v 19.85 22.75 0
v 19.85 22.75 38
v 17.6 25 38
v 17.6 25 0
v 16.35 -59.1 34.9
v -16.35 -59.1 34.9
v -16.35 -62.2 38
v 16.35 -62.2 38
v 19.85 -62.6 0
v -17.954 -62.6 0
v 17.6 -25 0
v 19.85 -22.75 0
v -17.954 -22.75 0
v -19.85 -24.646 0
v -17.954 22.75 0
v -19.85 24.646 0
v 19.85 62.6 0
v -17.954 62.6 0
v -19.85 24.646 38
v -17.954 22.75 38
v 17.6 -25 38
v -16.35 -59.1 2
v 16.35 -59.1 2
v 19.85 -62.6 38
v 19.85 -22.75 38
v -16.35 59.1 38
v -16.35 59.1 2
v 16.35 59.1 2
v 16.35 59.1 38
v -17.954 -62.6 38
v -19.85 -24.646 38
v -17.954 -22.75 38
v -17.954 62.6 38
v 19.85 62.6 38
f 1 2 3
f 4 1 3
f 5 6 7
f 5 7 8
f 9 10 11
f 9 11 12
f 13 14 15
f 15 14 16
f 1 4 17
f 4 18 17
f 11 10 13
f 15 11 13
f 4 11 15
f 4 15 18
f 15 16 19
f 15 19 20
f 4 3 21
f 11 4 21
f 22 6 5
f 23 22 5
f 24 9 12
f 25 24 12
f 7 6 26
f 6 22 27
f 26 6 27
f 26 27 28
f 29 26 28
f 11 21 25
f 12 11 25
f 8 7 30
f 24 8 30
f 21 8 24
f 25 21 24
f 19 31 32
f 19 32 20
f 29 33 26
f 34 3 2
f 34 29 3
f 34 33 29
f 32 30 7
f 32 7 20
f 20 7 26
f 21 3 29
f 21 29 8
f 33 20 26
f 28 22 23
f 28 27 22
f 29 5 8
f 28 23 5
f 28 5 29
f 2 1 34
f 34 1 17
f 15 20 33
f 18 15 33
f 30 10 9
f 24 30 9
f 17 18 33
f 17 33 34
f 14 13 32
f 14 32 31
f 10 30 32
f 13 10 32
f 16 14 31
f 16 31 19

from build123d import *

# Parameters (mm, degrees)
F0_W     = 39.7
F0_H     = 125.2
F0_W_2   = 32.7
F0_H_2   = 118.2
F1_DEPTH = 2
F2_DEPTH = 38
F4_DEPTH = 38.001
F5_SIZE  = 3.1


with BuildPart() as f1:
    # F0 (on Top) → F1 (new body)
    with BuildSketch(Plane.XY):
        Rectangle(F0_W, F0_H)
        Rectangle(F0_W_2, F0_H_2, mode=Mode.SUBTRACT)
        Rectangle(F0_W_2, F0_H_2)
    extrude(amount=F1_DEPTH)

    # F0 (on Top) → F2 (join)
    with BuildSketch(Plane.XY):
        Rectangle(F0_W, F0_H)
        Rectangle(F0_W_2, F0_H_2, mode=Mode.SUBTRACT)
    extrude(amount=F2_DEPTH)

    # F3 (on face) → F4 (cut, through all)
    with BuildSketch(Plane.XY.offset(38)):
        Polygon((-17.953553, 22.75), (-17.953553, 62.6), (-19.85, 62.6), (-19.85, 24.646447), align=None)
        Polygon((-19.85, -62.6), (-17.953553, -62.6), (-17.953553, -22.75), (-19.85, -24.646447), align=None)
        Polygon((19.85, -22.75), (19.85, 22.75), (17.6, 25), (17.6, -25), align=None)
    extrude(amount=-F4_DEPTH, mode=Mode.SUBTRACT)

    # F5
    f5_edges = [f1.edges().sort_by_distance(p)[0] for p in [
        (0, -59.1, 38),
    ]]
    chamfer(f5_edges, length=F5_SIZE)


solid = f1.part
